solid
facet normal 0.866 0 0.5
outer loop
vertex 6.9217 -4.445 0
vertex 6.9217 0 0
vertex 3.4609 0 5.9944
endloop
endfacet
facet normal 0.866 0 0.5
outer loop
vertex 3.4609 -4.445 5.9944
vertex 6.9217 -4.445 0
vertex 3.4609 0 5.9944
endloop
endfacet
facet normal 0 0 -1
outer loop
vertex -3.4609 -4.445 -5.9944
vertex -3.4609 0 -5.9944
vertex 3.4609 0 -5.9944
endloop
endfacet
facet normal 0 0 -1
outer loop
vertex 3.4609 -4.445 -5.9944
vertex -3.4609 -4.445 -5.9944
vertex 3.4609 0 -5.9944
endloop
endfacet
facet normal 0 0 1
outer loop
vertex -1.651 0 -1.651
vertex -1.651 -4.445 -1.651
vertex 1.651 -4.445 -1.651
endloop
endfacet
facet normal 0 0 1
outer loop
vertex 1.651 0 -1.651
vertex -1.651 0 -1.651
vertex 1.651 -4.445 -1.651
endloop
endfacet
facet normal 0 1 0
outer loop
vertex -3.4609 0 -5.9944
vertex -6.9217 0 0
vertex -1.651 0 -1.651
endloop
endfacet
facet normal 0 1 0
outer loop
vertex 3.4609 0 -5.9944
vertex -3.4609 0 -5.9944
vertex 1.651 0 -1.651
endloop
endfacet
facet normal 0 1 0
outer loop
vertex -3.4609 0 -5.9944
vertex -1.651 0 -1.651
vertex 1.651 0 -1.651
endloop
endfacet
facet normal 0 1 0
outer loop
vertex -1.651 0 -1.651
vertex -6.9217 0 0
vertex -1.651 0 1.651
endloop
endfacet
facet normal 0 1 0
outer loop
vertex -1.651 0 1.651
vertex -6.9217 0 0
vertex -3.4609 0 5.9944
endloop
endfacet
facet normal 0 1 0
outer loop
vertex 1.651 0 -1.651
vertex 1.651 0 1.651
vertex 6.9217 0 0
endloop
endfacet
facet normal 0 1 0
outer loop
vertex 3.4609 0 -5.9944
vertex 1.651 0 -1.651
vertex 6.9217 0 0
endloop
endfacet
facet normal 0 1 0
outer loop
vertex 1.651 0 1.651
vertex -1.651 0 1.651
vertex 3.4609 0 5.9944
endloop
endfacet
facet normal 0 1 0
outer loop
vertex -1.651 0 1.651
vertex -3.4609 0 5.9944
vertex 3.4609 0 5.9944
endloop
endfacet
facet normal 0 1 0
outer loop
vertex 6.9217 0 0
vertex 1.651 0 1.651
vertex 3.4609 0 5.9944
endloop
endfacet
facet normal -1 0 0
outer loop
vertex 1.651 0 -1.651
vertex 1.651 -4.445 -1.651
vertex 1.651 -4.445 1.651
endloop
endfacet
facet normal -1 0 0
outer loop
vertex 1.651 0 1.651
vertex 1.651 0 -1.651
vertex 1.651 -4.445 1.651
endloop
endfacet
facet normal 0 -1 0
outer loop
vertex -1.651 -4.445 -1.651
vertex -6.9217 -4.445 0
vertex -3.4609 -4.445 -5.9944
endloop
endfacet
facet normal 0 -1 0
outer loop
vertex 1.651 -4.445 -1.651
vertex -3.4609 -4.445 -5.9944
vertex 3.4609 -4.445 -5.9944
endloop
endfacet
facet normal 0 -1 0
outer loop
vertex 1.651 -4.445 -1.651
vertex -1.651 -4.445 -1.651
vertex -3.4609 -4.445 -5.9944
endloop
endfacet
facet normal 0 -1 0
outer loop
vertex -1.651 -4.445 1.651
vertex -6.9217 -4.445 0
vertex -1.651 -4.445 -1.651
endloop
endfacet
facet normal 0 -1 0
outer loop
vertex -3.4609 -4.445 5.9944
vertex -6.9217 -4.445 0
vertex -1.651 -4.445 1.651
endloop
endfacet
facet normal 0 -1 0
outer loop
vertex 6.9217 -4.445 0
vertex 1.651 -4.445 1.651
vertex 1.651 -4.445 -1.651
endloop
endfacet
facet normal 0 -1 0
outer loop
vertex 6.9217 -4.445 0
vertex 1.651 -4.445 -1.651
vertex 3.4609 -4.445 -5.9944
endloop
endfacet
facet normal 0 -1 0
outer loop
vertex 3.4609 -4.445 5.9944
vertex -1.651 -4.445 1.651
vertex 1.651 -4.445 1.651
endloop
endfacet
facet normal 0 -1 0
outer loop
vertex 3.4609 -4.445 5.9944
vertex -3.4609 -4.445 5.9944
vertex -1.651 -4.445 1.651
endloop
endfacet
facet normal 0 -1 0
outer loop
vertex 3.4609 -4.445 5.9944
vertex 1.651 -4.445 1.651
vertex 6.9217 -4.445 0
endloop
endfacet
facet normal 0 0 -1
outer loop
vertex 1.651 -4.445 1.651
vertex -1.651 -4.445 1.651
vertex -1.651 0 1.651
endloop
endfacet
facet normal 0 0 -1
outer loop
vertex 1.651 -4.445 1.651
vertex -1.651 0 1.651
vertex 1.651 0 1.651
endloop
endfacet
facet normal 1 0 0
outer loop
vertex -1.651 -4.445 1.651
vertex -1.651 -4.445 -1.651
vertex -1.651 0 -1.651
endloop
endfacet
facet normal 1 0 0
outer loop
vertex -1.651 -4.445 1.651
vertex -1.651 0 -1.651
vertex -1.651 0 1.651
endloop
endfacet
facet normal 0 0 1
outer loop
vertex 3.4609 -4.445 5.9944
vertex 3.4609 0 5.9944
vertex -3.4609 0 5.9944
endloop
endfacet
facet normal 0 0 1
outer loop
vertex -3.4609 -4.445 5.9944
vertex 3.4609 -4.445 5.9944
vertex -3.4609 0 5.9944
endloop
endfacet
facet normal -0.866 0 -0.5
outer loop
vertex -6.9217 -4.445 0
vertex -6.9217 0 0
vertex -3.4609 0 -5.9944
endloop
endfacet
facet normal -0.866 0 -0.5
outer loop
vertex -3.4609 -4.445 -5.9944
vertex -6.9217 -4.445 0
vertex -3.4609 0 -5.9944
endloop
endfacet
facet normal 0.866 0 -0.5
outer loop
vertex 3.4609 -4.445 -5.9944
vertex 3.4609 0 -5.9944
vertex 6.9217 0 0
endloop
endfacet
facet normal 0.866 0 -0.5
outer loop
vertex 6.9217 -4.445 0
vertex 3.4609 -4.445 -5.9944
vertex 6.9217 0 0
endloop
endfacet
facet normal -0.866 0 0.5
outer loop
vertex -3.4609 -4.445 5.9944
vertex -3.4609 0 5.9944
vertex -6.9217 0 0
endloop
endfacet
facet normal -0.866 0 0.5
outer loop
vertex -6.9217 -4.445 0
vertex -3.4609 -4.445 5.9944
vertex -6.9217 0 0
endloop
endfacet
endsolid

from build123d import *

# Parameters (mm, degrees)
F1_DEPTH = 4.445
F2_W     = 3.302
F2_H     = 3.302
F3_DEPTH = 25.4


with BuildPart() as f1:
    # F0 (on Front) → F1 (new body)
    with BuildSketch(Plane.XZ):
        Polygon((3.460868, 5.9944), (-3.460868, 5.9944), (-6.921737, 0), (-3.460868, -5.9944), (3.460868, -5.9944), (6.921737, 0), align=None)
    extrude(amount=F1_DEPTH)

    # F2 (on face) → F3 (cut)
    with BuildSketch(Plane.XZ.offset(4.445)):
        Rectangle(F2_W, F2_H)
    extrude(amount=-F3_DEPTH, mode=Mode.SUBTRACT)


solid = f1.part
